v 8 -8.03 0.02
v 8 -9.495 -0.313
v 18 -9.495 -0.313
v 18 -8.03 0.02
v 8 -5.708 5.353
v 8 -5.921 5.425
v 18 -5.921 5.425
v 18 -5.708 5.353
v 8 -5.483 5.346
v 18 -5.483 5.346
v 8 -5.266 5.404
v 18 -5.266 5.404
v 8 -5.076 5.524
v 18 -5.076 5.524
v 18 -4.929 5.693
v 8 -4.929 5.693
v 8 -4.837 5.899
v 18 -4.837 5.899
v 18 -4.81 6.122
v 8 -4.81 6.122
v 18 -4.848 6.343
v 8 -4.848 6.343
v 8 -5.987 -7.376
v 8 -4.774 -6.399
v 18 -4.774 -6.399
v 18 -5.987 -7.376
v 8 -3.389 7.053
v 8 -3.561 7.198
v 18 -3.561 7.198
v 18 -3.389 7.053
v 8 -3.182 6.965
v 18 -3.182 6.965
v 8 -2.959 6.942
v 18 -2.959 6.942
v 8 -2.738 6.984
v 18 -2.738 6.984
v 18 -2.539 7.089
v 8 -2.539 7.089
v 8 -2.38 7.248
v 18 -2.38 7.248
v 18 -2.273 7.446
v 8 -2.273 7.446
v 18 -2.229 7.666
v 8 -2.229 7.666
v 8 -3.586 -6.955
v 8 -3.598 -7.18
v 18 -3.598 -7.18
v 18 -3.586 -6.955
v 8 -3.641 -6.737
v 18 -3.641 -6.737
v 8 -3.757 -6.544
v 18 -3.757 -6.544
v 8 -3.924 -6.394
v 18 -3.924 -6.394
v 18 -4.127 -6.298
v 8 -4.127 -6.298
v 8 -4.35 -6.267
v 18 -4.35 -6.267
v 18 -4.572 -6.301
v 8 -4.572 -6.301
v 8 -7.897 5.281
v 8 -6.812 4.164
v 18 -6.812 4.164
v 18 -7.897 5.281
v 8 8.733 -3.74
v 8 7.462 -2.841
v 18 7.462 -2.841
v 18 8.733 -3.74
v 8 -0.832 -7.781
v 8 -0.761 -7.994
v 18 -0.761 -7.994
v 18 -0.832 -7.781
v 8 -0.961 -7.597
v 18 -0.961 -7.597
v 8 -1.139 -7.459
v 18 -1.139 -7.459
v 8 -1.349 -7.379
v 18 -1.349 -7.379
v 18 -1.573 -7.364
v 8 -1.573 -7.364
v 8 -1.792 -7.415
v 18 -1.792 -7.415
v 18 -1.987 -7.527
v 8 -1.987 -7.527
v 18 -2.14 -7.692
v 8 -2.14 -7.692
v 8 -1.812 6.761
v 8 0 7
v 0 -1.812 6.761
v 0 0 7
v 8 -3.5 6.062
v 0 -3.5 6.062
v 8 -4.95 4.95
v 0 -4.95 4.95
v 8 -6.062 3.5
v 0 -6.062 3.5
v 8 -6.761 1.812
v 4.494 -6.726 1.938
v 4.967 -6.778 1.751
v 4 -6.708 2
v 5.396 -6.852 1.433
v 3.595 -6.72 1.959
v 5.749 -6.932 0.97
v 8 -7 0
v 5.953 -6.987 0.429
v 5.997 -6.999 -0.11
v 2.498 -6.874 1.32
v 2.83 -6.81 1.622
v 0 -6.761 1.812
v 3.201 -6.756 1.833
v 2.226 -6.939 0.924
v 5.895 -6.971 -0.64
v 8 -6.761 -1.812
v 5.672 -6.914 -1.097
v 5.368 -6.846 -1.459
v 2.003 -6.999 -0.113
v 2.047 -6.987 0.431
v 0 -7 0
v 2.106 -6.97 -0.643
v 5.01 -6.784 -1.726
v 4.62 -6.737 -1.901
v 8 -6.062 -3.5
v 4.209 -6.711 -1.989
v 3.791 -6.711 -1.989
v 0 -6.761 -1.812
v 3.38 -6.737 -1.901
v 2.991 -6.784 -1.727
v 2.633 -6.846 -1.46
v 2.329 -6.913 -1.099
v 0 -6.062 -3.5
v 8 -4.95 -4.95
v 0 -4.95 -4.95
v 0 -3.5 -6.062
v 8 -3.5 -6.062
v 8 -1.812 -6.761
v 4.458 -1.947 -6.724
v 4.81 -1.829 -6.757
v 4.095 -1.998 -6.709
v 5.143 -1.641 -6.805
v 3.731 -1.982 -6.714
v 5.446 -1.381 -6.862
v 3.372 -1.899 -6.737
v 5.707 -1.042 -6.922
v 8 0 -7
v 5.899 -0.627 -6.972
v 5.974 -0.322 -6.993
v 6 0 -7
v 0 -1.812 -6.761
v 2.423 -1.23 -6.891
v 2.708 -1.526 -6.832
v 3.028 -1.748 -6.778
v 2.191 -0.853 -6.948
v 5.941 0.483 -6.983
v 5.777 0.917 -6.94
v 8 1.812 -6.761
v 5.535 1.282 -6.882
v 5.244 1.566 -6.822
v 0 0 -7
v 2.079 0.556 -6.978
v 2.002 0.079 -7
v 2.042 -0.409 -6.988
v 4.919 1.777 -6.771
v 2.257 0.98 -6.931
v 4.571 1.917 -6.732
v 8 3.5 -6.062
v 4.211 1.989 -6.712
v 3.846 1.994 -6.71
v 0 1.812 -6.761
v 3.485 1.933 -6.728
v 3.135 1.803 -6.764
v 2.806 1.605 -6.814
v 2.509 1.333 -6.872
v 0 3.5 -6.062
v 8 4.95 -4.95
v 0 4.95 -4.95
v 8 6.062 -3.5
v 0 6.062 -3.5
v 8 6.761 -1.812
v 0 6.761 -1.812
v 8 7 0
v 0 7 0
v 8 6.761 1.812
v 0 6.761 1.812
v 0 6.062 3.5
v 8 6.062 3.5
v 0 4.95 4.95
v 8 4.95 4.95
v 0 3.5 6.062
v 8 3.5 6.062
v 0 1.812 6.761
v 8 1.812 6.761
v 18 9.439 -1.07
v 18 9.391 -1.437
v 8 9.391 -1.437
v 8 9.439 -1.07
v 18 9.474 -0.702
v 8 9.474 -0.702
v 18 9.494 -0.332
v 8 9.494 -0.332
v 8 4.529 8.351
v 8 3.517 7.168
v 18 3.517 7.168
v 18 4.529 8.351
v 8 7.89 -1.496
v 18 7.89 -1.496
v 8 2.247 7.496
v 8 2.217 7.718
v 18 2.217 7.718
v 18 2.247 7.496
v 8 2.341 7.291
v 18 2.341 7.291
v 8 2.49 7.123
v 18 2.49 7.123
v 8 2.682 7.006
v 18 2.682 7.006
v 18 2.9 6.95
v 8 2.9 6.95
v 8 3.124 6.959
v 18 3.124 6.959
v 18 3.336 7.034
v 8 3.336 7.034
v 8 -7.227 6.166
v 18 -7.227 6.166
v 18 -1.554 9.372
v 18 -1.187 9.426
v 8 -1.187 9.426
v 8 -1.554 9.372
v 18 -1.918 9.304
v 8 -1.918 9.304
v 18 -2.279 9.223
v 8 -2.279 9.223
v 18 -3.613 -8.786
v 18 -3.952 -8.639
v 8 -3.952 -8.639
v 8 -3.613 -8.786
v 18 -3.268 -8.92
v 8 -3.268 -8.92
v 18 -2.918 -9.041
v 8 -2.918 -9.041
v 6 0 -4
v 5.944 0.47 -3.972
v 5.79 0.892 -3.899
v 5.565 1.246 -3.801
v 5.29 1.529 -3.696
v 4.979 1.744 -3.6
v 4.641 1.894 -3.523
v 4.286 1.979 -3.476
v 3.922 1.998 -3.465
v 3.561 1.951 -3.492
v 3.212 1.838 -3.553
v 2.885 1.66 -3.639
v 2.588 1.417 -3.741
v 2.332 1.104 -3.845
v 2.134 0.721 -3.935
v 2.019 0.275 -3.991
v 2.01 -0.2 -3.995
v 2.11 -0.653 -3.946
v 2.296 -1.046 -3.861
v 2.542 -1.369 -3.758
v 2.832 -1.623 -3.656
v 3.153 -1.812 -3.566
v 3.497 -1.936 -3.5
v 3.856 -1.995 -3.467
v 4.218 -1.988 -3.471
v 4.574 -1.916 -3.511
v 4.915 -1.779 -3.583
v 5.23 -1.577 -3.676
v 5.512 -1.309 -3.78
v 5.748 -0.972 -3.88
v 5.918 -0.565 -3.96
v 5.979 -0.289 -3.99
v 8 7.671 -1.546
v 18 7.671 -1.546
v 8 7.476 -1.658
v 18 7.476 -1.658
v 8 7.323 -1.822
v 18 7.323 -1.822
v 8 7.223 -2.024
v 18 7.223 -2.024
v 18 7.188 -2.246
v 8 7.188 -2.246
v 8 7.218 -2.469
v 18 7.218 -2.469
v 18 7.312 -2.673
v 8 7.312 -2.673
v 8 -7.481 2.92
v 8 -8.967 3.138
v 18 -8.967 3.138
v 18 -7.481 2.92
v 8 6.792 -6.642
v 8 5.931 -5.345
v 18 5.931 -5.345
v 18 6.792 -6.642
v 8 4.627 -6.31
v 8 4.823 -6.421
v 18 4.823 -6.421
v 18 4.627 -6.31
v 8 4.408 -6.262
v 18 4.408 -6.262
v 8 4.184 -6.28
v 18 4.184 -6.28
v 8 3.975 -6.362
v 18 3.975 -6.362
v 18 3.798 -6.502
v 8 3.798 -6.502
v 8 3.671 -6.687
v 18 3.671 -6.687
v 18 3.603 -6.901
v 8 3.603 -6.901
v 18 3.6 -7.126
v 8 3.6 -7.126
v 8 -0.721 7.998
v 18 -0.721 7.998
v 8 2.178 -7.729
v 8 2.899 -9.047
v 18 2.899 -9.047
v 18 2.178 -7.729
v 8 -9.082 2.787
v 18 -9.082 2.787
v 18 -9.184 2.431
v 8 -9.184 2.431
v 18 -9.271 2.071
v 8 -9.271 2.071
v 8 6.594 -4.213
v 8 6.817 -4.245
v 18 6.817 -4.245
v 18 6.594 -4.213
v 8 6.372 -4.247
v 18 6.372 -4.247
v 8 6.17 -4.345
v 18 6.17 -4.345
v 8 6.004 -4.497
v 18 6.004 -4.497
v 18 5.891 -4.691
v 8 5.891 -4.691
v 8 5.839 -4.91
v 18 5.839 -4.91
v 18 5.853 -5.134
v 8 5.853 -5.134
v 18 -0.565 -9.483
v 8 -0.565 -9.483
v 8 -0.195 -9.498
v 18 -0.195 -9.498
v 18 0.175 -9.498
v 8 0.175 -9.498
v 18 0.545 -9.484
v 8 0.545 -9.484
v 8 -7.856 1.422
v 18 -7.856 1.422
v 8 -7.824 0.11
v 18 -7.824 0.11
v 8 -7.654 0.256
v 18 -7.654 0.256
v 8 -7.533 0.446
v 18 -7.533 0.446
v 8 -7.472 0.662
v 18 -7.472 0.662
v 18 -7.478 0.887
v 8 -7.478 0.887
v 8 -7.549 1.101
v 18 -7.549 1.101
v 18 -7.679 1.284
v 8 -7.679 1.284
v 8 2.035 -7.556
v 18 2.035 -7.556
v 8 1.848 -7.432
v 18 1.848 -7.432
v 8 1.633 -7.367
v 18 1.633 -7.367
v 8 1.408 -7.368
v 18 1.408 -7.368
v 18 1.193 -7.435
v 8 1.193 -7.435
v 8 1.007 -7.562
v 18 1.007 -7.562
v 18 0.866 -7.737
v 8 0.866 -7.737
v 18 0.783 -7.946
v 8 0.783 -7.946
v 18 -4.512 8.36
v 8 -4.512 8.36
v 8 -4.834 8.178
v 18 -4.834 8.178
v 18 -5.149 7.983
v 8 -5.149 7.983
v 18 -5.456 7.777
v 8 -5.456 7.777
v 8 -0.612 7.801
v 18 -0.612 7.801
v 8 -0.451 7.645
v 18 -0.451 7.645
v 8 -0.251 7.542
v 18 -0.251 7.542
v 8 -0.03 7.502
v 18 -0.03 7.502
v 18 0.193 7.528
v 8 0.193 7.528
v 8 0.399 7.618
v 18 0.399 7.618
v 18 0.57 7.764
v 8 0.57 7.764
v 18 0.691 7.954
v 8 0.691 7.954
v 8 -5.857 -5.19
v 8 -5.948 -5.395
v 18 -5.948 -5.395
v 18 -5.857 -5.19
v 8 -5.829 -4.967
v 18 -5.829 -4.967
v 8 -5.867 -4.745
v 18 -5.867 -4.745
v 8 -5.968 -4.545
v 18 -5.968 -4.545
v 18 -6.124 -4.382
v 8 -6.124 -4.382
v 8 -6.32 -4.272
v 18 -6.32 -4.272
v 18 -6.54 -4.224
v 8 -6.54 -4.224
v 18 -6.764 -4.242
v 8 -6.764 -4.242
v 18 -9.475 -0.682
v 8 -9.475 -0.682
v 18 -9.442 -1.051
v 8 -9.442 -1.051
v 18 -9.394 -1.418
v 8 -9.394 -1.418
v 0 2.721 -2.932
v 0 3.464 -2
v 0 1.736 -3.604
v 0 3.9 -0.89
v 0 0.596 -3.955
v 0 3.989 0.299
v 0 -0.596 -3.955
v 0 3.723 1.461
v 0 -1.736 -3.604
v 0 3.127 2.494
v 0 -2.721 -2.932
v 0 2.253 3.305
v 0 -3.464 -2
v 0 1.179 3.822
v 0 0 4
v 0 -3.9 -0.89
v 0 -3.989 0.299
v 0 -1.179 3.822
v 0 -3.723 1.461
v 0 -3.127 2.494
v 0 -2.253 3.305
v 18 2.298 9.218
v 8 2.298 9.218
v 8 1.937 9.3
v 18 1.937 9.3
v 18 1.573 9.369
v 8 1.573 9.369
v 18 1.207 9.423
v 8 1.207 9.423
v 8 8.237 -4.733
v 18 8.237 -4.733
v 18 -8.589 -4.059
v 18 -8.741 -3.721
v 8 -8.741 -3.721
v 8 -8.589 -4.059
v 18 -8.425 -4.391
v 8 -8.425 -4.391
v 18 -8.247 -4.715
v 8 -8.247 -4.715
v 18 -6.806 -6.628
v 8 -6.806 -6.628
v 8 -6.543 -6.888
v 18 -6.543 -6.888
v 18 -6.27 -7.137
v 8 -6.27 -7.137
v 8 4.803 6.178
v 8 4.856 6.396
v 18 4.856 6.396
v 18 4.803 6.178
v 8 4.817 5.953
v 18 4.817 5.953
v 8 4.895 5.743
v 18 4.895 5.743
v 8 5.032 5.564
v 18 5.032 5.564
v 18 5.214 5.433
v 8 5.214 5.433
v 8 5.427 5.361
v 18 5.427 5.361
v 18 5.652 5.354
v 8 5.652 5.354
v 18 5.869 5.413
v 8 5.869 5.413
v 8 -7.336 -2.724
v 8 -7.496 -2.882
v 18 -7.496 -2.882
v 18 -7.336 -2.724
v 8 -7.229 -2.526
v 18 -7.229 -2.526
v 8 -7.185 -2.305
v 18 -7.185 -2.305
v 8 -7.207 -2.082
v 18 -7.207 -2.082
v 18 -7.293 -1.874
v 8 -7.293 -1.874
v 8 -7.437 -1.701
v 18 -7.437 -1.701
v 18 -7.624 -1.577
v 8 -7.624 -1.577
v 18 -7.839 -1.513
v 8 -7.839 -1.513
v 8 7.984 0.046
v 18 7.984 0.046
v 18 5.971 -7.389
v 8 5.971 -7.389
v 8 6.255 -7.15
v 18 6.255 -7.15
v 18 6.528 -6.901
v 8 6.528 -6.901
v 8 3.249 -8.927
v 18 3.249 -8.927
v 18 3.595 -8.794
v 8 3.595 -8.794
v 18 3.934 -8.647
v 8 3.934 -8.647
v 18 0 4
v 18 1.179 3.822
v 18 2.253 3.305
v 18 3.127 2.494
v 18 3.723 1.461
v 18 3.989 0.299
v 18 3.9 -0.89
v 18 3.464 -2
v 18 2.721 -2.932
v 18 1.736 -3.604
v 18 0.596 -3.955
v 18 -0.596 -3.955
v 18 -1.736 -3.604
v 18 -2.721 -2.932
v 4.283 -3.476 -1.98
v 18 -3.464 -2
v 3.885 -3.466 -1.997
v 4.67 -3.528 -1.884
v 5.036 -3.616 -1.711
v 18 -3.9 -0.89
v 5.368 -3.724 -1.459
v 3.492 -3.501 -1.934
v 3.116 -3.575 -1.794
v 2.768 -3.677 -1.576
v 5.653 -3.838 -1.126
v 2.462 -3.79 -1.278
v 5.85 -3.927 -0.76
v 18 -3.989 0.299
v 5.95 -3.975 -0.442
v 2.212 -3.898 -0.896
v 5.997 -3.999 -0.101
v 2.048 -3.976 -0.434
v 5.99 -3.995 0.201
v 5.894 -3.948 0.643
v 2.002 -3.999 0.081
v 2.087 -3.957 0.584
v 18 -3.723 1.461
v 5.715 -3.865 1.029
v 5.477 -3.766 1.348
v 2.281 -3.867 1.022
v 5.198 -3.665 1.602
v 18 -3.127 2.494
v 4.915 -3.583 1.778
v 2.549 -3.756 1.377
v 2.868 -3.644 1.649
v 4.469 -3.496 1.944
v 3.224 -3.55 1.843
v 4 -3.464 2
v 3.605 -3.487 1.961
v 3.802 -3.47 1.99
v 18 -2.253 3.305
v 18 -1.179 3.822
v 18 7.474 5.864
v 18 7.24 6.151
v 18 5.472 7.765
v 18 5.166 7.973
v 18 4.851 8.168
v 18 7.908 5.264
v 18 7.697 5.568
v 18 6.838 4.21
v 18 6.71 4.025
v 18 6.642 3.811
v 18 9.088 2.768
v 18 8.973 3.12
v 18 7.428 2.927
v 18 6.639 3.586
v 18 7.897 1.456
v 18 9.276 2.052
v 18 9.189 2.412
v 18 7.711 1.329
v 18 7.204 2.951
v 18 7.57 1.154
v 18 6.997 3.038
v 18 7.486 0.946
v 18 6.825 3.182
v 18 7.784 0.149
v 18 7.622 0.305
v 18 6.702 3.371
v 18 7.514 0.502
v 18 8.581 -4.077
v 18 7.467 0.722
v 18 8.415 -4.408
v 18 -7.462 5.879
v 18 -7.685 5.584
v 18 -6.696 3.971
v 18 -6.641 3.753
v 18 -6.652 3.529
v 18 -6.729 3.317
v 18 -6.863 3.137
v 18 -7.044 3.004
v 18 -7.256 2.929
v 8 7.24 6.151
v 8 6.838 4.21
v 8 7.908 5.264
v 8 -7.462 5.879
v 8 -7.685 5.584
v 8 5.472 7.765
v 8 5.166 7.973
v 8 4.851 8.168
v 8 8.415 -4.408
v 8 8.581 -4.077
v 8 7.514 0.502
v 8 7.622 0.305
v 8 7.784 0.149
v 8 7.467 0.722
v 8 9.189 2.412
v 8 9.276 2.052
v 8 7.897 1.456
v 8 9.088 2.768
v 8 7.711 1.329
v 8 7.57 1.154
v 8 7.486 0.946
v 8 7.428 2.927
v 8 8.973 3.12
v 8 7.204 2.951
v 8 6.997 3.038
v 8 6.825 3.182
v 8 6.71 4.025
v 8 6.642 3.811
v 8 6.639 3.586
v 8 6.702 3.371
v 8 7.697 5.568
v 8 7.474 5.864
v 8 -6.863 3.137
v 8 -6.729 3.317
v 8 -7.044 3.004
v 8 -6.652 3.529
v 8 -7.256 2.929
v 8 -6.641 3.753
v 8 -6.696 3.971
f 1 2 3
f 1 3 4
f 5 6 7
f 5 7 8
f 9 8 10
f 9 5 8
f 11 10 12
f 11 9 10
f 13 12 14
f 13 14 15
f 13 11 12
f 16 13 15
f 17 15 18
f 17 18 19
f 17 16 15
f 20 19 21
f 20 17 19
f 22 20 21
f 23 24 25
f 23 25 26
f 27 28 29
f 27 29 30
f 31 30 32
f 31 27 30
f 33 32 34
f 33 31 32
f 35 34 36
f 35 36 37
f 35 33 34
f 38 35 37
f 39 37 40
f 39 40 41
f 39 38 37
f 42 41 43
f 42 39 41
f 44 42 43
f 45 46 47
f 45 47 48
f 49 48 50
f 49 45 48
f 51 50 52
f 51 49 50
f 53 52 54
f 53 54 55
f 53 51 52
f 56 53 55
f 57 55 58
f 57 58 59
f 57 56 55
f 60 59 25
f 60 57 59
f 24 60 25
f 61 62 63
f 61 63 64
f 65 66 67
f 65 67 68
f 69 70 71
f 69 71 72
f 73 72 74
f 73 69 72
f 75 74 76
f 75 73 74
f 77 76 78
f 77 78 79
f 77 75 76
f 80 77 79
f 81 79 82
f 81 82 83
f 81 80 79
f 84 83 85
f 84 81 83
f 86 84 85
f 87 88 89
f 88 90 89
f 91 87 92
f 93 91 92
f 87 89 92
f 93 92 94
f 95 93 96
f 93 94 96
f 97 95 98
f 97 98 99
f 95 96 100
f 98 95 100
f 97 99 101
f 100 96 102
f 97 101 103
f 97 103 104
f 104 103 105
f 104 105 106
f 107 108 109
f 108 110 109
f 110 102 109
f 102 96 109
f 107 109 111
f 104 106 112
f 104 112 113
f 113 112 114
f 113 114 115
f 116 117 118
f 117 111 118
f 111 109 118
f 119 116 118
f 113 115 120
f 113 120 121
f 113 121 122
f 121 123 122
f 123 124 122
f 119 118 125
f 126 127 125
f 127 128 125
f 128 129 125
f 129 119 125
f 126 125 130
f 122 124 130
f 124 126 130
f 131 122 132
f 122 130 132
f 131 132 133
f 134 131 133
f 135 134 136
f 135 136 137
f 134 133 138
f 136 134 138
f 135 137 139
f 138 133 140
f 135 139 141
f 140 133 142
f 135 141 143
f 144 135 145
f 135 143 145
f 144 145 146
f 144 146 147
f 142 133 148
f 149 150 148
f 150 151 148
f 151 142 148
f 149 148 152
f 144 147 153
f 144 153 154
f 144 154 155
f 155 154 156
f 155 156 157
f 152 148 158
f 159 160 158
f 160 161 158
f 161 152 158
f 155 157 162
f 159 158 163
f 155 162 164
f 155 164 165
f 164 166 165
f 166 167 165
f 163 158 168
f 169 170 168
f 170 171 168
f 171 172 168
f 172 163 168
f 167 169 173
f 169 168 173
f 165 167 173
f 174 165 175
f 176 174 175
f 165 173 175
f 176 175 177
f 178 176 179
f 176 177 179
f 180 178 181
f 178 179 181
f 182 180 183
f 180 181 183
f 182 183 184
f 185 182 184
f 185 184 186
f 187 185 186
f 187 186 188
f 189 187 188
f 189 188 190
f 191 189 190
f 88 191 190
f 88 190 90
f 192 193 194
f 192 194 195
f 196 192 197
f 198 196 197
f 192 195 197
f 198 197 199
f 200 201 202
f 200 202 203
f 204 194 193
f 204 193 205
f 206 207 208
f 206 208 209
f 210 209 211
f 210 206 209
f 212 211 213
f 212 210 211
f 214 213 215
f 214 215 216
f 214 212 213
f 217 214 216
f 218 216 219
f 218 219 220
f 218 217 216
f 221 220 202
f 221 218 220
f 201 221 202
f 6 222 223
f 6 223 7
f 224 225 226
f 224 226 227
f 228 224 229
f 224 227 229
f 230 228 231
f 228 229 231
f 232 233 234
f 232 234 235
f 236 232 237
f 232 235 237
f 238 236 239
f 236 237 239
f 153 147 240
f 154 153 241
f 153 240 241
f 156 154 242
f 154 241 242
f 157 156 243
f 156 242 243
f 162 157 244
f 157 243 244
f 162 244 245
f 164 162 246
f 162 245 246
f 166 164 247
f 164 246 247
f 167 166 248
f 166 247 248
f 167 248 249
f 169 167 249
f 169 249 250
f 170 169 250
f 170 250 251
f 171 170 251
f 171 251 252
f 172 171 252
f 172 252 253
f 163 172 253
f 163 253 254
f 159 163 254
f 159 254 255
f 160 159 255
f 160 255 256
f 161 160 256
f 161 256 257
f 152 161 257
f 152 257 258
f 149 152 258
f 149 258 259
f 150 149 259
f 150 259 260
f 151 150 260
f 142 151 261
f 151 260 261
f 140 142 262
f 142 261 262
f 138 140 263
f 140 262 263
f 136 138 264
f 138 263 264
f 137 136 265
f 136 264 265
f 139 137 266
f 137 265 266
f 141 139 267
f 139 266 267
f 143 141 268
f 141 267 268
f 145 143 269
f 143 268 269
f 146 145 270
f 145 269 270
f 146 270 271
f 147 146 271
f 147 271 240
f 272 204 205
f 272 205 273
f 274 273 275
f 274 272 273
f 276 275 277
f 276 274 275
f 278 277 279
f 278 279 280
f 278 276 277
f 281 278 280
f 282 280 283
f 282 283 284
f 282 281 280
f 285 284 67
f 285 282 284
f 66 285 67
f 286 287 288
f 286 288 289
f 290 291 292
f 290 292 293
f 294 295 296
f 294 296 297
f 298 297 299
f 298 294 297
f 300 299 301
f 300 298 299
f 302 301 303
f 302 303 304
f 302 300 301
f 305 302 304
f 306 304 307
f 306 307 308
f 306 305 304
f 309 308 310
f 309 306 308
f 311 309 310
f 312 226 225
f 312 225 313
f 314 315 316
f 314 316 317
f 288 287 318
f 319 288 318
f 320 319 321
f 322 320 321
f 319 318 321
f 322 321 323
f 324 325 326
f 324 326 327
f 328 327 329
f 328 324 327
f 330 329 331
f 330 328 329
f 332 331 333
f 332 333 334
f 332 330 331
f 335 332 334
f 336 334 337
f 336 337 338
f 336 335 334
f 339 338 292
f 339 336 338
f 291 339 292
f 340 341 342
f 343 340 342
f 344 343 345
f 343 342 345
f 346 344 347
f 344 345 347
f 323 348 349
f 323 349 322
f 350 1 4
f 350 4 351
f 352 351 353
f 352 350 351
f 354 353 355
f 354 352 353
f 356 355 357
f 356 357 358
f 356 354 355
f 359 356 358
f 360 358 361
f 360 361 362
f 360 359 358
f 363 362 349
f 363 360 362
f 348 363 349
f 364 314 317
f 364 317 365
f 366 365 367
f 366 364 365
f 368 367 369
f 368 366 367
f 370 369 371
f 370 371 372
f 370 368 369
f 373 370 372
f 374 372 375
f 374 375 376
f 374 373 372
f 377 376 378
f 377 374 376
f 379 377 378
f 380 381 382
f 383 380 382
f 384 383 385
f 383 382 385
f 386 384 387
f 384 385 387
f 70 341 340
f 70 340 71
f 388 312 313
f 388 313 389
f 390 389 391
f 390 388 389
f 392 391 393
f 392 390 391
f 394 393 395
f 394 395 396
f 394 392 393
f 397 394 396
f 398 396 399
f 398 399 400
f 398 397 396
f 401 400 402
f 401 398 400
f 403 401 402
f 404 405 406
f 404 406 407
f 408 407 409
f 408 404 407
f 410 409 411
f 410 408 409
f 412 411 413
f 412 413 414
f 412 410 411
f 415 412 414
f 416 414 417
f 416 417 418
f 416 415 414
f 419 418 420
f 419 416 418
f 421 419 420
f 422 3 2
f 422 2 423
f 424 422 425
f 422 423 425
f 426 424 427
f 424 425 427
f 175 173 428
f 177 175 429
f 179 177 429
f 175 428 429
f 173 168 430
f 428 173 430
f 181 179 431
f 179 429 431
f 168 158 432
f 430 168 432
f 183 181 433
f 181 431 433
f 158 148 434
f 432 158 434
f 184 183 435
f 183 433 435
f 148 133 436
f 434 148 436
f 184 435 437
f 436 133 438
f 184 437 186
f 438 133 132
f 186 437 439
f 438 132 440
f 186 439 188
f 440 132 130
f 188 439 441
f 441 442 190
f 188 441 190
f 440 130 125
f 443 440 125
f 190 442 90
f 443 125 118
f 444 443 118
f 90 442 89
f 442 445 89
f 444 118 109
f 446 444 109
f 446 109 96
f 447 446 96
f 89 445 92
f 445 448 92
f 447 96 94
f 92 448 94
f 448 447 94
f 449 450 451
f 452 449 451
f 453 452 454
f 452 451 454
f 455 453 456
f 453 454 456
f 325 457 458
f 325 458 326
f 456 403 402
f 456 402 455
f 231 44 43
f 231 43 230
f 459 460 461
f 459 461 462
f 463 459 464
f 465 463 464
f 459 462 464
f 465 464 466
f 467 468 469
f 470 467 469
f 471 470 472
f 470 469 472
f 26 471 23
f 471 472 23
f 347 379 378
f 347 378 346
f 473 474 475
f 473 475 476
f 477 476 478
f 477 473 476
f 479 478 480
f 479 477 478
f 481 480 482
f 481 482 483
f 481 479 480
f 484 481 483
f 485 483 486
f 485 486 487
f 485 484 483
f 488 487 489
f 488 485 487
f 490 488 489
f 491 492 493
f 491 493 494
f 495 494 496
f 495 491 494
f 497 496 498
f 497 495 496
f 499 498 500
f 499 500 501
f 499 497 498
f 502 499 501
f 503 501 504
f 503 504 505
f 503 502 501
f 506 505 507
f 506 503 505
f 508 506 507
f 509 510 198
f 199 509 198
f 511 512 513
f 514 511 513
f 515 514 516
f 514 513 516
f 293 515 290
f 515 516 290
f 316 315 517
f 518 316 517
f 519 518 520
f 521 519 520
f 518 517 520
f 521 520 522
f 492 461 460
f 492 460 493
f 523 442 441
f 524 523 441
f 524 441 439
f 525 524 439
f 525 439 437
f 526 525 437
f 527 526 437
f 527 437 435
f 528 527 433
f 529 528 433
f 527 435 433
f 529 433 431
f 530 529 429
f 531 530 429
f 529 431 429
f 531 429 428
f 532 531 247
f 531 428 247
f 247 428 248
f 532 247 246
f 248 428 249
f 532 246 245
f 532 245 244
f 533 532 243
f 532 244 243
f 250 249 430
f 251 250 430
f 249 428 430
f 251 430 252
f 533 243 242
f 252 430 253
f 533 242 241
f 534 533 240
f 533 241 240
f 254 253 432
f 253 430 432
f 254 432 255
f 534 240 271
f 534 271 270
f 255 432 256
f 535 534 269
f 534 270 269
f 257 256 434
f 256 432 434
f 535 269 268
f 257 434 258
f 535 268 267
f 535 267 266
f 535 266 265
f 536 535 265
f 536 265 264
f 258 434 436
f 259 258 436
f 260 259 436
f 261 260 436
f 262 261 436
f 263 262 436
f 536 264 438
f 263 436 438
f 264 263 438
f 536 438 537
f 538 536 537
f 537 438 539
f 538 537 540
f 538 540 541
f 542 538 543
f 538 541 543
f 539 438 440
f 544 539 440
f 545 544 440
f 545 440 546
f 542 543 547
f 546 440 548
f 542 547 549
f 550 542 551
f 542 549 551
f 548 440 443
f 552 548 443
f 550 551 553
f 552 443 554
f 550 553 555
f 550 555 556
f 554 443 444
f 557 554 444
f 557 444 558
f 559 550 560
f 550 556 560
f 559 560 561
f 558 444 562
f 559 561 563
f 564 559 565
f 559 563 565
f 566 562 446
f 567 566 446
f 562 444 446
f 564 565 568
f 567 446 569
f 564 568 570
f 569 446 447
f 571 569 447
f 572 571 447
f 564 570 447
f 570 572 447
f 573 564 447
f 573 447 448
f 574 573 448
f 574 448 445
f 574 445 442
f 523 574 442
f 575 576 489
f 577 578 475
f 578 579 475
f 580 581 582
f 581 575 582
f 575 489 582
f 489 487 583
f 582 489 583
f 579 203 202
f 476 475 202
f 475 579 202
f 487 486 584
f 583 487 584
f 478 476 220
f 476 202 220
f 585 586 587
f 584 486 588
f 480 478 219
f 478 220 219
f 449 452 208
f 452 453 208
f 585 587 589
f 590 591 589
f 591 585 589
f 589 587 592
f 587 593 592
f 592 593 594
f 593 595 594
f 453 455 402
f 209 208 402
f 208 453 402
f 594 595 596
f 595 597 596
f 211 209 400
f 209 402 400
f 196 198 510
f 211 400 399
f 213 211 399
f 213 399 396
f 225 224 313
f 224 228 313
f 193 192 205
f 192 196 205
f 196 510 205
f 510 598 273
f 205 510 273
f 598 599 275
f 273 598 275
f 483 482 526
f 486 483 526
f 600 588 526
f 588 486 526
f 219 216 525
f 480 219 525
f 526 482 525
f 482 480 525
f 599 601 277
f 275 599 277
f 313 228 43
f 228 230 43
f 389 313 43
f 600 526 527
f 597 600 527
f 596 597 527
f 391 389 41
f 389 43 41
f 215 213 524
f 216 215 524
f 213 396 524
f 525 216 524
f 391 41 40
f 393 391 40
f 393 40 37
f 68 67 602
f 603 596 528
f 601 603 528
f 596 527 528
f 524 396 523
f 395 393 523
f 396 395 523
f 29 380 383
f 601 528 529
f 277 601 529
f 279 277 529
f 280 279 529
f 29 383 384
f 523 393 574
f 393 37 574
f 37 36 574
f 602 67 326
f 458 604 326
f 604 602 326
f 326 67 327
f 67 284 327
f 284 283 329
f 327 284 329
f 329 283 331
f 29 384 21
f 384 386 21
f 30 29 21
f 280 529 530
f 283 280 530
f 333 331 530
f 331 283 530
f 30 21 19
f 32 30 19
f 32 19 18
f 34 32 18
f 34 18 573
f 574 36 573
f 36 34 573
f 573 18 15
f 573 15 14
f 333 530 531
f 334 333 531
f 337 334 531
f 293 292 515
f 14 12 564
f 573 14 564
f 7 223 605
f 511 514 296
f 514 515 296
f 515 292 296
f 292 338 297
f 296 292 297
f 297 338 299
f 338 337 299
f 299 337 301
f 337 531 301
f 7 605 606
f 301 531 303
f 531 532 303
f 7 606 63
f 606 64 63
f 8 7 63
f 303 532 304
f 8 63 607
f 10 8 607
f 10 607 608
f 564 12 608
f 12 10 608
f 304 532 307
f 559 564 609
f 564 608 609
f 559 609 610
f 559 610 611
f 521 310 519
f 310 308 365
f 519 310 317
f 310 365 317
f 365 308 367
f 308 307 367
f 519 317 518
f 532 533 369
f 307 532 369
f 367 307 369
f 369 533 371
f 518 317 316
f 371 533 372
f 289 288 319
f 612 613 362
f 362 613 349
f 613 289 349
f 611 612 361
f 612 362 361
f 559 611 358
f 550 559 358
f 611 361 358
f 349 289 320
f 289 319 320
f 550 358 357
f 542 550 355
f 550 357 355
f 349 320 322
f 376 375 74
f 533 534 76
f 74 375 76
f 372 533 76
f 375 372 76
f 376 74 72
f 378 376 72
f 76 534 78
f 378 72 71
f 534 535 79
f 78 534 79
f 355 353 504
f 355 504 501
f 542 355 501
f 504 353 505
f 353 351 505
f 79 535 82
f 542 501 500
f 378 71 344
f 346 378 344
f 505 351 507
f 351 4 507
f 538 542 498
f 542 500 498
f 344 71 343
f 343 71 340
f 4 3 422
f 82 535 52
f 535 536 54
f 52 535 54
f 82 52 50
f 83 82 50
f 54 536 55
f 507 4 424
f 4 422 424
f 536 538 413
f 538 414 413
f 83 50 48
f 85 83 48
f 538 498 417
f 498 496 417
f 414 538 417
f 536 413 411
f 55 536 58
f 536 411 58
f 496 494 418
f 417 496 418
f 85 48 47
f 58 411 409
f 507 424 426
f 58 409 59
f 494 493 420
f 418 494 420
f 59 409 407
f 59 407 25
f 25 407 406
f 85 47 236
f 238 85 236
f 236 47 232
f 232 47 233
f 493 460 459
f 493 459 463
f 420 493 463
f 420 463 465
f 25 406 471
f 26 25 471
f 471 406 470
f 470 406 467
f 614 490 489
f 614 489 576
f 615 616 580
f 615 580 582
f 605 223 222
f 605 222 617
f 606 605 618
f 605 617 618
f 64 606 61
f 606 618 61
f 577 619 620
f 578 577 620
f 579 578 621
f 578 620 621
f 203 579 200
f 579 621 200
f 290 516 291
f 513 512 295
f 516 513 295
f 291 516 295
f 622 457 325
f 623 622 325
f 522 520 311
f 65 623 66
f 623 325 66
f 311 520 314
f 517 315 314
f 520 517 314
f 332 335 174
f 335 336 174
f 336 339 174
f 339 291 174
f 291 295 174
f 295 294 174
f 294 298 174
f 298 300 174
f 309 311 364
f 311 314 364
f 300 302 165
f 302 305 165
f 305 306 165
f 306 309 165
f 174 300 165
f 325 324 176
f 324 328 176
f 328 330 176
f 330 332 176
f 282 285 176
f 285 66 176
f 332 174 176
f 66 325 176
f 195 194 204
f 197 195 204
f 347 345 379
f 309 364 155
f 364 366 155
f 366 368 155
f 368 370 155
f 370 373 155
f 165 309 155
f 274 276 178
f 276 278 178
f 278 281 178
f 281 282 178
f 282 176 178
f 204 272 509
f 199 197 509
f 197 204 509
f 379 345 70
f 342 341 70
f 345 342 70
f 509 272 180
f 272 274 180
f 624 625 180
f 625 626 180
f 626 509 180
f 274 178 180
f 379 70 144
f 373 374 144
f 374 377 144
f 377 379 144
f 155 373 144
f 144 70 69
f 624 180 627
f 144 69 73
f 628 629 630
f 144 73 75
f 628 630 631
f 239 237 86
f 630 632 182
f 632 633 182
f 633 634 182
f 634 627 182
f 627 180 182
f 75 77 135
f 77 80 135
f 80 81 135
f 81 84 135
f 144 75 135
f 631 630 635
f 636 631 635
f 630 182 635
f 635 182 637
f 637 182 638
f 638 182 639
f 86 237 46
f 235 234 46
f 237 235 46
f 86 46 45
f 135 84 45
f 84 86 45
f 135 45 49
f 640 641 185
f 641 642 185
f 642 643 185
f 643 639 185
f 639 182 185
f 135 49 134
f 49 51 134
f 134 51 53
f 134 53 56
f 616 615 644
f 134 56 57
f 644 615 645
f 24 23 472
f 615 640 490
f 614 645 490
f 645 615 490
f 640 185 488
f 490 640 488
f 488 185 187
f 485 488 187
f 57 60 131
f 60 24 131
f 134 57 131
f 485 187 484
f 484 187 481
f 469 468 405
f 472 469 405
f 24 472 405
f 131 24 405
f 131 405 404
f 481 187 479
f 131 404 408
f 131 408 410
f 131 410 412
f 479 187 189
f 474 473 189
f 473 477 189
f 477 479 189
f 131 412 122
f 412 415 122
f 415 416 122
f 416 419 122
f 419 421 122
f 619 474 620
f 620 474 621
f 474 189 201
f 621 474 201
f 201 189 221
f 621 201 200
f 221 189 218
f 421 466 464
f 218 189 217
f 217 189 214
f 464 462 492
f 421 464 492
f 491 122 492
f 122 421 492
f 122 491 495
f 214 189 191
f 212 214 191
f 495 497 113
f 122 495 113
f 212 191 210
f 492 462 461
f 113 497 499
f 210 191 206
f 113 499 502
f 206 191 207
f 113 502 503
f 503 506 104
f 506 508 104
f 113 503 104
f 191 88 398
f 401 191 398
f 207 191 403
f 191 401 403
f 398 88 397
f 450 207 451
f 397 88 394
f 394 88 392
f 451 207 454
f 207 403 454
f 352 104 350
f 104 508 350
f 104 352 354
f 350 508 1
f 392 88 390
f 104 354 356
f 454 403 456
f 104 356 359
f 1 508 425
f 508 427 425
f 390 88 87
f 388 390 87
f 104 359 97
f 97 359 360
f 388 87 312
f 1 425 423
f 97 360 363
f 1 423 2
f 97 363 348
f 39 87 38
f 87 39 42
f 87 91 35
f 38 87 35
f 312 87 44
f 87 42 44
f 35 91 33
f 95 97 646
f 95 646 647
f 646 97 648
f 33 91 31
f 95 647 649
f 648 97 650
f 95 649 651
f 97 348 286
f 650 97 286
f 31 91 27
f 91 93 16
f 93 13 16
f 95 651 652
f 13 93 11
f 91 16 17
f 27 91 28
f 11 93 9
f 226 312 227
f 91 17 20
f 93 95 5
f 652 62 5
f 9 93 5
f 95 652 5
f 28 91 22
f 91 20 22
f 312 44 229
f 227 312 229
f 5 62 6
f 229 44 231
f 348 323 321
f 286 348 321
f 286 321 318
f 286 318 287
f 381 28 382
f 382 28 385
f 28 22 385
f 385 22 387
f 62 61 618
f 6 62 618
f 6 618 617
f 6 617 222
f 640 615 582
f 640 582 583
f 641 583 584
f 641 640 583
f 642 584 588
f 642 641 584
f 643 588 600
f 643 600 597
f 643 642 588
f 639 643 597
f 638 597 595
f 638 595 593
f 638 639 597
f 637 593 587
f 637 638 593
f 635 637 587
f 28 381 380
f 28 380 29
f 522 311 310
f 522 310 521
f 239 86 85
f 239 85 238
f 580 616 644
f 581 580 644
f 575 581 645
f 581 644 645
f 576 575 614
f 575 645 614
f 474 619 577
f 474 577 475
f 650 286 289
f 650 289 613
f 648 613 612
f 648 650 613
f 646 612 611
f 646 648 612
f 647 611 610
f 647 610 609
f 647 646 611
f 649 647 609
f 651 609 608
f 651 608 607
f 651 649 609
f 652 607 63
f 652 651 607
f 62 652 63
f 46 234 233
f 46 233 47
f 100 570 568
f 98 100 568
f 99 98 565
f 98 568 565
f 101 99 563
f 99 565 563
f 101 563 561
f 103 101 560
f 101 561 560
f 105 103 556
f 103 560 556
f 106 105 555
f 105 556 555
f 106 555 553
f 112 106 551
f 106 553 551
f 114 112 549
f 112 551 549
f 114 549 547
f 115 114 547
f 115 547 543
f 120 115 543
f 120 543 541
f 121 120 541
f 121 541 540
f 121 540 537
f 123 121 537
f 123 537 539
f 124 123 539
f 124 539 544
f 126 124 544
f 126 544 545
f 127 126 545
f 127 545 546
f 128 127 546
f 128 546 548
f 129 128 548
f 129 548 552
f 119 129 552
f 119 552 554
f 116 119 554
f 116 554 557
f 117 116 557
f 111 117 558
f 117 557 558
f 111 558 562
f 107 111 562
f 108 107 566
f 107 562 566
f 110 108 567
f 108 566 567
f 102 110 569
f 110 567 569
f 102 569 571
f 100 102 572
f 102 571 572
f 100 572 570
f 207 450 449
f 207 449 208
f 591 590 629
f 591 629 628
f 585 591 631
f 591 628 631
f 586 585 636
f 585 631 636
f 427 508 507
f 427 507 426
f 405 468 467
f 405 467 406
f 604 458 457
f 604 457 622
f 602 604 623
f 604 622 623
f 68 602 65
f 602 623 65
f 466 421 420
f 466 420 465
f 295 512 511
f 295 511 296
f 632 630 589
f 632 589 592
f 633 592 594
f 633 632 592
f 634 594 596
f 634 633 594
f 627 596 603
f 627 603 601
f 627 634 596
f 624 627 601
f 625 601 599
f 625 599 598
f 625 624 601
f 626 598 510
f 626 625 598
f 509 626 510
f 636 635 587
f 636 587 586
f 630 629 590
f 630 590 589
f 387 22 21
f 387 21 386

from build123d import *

# Parameters (mm, degrees)
SKETCH_2_R               = 4
CUT_EXTRUDE_1_DEPTH      = 20
CUT_EXTRUDE_2_DEPTH      = 10
PATTERN_CIRCULAR_1_COUNT = 17
SKETCH_4_R               = 2
CUT_EXTRUDE_3_DEPTH      = 10
SKETCH_5_R               = 2
CUT_EXTRUDE_4_DEPTH      = 10


with BuildPart() as part:
    # Эскиз1 → Повернуть1 (revolve)
    with BuildSketch(Plane.XY):
        Polygon((18, 0), (18, 9.5), (8, 9.5), (8, 7), (0, 7), (0, 0), align=None)
    revolve(axis=Axis((0, 0, 0), (1, 0, 0)))

    # Эскиз2 → Вырез-Вытянуть1 (cut)
    with BuildSketch(Plane.ZY):
        Circle(SKETCH_2_R)
    extrude(amount=-CUT_EXTRUDE_1_DEPTH, mode=Mode.SUBTRACT)

    # Эскиз3 → Вырез-Вытянуть2 (cut)
    with BuildSketch(Plane.ZY.offset(-8)):
        with BuildLine():
            Line((0.046298541, 7.983921855), (-0.332359624, 9.494184382))
            ThreePointArc((-0.332359624, 9.494184382), (0.866716129, 9.460380709), (2.051973159, 9.27574289))
            Line((2.051973159, 9.27574289), (1.455655646, 7.897482676))
            ThreePointArc((1.455655646, 7.897482676), (0.721917095, 7.466890324), (0.046298541, 7.983921855))
        make_face()
    cut_extrude_2 = extrude(amount=-CUT_EXTRUDE_2_DEPTH, mode=Mode.SUBTRACT)

    # Круговой массив1: Вырез-Вытянуть2 ×17 about axis
    pattern_circular_1_axis = Axis((18, 0, 0), (-1, 0, 0))
    for i in range(1, PATTERN_CIRCULAR_1_COUNT):
        add(cut_extrude_2.rotate(pattern_circular_1_axis, i * 360 / PATTERN_CIRCULAR_1_COUNT), mode=Mode.SUBTRACT)

    # Эскиз4 → Вырез-Вытянуть3 (cut)
    with BuildSketch(Plane(origin=(0, 0, 0), x_dir=(1, 0, 0), z_dir=(0, 1, 0))):
        with Locations((4, 0)):
            Circle(SKETCH_4_R)
    extrude(amount=-CUT_EXTRUDE_3_DEPTH, mode=Mode.SUBTRACT)

    # Эскиз5 → Вырез-Вытянуть4 (cut)
    with BuildSketch(Plane.XY):
        with Locations((4, 0)):
            Circle(SKETCH_5_R)
    extrude(amount=-CUT_EXTRUDE_4_DEPTH, mode=Mode.SUBTRACT)


solid = part.part
